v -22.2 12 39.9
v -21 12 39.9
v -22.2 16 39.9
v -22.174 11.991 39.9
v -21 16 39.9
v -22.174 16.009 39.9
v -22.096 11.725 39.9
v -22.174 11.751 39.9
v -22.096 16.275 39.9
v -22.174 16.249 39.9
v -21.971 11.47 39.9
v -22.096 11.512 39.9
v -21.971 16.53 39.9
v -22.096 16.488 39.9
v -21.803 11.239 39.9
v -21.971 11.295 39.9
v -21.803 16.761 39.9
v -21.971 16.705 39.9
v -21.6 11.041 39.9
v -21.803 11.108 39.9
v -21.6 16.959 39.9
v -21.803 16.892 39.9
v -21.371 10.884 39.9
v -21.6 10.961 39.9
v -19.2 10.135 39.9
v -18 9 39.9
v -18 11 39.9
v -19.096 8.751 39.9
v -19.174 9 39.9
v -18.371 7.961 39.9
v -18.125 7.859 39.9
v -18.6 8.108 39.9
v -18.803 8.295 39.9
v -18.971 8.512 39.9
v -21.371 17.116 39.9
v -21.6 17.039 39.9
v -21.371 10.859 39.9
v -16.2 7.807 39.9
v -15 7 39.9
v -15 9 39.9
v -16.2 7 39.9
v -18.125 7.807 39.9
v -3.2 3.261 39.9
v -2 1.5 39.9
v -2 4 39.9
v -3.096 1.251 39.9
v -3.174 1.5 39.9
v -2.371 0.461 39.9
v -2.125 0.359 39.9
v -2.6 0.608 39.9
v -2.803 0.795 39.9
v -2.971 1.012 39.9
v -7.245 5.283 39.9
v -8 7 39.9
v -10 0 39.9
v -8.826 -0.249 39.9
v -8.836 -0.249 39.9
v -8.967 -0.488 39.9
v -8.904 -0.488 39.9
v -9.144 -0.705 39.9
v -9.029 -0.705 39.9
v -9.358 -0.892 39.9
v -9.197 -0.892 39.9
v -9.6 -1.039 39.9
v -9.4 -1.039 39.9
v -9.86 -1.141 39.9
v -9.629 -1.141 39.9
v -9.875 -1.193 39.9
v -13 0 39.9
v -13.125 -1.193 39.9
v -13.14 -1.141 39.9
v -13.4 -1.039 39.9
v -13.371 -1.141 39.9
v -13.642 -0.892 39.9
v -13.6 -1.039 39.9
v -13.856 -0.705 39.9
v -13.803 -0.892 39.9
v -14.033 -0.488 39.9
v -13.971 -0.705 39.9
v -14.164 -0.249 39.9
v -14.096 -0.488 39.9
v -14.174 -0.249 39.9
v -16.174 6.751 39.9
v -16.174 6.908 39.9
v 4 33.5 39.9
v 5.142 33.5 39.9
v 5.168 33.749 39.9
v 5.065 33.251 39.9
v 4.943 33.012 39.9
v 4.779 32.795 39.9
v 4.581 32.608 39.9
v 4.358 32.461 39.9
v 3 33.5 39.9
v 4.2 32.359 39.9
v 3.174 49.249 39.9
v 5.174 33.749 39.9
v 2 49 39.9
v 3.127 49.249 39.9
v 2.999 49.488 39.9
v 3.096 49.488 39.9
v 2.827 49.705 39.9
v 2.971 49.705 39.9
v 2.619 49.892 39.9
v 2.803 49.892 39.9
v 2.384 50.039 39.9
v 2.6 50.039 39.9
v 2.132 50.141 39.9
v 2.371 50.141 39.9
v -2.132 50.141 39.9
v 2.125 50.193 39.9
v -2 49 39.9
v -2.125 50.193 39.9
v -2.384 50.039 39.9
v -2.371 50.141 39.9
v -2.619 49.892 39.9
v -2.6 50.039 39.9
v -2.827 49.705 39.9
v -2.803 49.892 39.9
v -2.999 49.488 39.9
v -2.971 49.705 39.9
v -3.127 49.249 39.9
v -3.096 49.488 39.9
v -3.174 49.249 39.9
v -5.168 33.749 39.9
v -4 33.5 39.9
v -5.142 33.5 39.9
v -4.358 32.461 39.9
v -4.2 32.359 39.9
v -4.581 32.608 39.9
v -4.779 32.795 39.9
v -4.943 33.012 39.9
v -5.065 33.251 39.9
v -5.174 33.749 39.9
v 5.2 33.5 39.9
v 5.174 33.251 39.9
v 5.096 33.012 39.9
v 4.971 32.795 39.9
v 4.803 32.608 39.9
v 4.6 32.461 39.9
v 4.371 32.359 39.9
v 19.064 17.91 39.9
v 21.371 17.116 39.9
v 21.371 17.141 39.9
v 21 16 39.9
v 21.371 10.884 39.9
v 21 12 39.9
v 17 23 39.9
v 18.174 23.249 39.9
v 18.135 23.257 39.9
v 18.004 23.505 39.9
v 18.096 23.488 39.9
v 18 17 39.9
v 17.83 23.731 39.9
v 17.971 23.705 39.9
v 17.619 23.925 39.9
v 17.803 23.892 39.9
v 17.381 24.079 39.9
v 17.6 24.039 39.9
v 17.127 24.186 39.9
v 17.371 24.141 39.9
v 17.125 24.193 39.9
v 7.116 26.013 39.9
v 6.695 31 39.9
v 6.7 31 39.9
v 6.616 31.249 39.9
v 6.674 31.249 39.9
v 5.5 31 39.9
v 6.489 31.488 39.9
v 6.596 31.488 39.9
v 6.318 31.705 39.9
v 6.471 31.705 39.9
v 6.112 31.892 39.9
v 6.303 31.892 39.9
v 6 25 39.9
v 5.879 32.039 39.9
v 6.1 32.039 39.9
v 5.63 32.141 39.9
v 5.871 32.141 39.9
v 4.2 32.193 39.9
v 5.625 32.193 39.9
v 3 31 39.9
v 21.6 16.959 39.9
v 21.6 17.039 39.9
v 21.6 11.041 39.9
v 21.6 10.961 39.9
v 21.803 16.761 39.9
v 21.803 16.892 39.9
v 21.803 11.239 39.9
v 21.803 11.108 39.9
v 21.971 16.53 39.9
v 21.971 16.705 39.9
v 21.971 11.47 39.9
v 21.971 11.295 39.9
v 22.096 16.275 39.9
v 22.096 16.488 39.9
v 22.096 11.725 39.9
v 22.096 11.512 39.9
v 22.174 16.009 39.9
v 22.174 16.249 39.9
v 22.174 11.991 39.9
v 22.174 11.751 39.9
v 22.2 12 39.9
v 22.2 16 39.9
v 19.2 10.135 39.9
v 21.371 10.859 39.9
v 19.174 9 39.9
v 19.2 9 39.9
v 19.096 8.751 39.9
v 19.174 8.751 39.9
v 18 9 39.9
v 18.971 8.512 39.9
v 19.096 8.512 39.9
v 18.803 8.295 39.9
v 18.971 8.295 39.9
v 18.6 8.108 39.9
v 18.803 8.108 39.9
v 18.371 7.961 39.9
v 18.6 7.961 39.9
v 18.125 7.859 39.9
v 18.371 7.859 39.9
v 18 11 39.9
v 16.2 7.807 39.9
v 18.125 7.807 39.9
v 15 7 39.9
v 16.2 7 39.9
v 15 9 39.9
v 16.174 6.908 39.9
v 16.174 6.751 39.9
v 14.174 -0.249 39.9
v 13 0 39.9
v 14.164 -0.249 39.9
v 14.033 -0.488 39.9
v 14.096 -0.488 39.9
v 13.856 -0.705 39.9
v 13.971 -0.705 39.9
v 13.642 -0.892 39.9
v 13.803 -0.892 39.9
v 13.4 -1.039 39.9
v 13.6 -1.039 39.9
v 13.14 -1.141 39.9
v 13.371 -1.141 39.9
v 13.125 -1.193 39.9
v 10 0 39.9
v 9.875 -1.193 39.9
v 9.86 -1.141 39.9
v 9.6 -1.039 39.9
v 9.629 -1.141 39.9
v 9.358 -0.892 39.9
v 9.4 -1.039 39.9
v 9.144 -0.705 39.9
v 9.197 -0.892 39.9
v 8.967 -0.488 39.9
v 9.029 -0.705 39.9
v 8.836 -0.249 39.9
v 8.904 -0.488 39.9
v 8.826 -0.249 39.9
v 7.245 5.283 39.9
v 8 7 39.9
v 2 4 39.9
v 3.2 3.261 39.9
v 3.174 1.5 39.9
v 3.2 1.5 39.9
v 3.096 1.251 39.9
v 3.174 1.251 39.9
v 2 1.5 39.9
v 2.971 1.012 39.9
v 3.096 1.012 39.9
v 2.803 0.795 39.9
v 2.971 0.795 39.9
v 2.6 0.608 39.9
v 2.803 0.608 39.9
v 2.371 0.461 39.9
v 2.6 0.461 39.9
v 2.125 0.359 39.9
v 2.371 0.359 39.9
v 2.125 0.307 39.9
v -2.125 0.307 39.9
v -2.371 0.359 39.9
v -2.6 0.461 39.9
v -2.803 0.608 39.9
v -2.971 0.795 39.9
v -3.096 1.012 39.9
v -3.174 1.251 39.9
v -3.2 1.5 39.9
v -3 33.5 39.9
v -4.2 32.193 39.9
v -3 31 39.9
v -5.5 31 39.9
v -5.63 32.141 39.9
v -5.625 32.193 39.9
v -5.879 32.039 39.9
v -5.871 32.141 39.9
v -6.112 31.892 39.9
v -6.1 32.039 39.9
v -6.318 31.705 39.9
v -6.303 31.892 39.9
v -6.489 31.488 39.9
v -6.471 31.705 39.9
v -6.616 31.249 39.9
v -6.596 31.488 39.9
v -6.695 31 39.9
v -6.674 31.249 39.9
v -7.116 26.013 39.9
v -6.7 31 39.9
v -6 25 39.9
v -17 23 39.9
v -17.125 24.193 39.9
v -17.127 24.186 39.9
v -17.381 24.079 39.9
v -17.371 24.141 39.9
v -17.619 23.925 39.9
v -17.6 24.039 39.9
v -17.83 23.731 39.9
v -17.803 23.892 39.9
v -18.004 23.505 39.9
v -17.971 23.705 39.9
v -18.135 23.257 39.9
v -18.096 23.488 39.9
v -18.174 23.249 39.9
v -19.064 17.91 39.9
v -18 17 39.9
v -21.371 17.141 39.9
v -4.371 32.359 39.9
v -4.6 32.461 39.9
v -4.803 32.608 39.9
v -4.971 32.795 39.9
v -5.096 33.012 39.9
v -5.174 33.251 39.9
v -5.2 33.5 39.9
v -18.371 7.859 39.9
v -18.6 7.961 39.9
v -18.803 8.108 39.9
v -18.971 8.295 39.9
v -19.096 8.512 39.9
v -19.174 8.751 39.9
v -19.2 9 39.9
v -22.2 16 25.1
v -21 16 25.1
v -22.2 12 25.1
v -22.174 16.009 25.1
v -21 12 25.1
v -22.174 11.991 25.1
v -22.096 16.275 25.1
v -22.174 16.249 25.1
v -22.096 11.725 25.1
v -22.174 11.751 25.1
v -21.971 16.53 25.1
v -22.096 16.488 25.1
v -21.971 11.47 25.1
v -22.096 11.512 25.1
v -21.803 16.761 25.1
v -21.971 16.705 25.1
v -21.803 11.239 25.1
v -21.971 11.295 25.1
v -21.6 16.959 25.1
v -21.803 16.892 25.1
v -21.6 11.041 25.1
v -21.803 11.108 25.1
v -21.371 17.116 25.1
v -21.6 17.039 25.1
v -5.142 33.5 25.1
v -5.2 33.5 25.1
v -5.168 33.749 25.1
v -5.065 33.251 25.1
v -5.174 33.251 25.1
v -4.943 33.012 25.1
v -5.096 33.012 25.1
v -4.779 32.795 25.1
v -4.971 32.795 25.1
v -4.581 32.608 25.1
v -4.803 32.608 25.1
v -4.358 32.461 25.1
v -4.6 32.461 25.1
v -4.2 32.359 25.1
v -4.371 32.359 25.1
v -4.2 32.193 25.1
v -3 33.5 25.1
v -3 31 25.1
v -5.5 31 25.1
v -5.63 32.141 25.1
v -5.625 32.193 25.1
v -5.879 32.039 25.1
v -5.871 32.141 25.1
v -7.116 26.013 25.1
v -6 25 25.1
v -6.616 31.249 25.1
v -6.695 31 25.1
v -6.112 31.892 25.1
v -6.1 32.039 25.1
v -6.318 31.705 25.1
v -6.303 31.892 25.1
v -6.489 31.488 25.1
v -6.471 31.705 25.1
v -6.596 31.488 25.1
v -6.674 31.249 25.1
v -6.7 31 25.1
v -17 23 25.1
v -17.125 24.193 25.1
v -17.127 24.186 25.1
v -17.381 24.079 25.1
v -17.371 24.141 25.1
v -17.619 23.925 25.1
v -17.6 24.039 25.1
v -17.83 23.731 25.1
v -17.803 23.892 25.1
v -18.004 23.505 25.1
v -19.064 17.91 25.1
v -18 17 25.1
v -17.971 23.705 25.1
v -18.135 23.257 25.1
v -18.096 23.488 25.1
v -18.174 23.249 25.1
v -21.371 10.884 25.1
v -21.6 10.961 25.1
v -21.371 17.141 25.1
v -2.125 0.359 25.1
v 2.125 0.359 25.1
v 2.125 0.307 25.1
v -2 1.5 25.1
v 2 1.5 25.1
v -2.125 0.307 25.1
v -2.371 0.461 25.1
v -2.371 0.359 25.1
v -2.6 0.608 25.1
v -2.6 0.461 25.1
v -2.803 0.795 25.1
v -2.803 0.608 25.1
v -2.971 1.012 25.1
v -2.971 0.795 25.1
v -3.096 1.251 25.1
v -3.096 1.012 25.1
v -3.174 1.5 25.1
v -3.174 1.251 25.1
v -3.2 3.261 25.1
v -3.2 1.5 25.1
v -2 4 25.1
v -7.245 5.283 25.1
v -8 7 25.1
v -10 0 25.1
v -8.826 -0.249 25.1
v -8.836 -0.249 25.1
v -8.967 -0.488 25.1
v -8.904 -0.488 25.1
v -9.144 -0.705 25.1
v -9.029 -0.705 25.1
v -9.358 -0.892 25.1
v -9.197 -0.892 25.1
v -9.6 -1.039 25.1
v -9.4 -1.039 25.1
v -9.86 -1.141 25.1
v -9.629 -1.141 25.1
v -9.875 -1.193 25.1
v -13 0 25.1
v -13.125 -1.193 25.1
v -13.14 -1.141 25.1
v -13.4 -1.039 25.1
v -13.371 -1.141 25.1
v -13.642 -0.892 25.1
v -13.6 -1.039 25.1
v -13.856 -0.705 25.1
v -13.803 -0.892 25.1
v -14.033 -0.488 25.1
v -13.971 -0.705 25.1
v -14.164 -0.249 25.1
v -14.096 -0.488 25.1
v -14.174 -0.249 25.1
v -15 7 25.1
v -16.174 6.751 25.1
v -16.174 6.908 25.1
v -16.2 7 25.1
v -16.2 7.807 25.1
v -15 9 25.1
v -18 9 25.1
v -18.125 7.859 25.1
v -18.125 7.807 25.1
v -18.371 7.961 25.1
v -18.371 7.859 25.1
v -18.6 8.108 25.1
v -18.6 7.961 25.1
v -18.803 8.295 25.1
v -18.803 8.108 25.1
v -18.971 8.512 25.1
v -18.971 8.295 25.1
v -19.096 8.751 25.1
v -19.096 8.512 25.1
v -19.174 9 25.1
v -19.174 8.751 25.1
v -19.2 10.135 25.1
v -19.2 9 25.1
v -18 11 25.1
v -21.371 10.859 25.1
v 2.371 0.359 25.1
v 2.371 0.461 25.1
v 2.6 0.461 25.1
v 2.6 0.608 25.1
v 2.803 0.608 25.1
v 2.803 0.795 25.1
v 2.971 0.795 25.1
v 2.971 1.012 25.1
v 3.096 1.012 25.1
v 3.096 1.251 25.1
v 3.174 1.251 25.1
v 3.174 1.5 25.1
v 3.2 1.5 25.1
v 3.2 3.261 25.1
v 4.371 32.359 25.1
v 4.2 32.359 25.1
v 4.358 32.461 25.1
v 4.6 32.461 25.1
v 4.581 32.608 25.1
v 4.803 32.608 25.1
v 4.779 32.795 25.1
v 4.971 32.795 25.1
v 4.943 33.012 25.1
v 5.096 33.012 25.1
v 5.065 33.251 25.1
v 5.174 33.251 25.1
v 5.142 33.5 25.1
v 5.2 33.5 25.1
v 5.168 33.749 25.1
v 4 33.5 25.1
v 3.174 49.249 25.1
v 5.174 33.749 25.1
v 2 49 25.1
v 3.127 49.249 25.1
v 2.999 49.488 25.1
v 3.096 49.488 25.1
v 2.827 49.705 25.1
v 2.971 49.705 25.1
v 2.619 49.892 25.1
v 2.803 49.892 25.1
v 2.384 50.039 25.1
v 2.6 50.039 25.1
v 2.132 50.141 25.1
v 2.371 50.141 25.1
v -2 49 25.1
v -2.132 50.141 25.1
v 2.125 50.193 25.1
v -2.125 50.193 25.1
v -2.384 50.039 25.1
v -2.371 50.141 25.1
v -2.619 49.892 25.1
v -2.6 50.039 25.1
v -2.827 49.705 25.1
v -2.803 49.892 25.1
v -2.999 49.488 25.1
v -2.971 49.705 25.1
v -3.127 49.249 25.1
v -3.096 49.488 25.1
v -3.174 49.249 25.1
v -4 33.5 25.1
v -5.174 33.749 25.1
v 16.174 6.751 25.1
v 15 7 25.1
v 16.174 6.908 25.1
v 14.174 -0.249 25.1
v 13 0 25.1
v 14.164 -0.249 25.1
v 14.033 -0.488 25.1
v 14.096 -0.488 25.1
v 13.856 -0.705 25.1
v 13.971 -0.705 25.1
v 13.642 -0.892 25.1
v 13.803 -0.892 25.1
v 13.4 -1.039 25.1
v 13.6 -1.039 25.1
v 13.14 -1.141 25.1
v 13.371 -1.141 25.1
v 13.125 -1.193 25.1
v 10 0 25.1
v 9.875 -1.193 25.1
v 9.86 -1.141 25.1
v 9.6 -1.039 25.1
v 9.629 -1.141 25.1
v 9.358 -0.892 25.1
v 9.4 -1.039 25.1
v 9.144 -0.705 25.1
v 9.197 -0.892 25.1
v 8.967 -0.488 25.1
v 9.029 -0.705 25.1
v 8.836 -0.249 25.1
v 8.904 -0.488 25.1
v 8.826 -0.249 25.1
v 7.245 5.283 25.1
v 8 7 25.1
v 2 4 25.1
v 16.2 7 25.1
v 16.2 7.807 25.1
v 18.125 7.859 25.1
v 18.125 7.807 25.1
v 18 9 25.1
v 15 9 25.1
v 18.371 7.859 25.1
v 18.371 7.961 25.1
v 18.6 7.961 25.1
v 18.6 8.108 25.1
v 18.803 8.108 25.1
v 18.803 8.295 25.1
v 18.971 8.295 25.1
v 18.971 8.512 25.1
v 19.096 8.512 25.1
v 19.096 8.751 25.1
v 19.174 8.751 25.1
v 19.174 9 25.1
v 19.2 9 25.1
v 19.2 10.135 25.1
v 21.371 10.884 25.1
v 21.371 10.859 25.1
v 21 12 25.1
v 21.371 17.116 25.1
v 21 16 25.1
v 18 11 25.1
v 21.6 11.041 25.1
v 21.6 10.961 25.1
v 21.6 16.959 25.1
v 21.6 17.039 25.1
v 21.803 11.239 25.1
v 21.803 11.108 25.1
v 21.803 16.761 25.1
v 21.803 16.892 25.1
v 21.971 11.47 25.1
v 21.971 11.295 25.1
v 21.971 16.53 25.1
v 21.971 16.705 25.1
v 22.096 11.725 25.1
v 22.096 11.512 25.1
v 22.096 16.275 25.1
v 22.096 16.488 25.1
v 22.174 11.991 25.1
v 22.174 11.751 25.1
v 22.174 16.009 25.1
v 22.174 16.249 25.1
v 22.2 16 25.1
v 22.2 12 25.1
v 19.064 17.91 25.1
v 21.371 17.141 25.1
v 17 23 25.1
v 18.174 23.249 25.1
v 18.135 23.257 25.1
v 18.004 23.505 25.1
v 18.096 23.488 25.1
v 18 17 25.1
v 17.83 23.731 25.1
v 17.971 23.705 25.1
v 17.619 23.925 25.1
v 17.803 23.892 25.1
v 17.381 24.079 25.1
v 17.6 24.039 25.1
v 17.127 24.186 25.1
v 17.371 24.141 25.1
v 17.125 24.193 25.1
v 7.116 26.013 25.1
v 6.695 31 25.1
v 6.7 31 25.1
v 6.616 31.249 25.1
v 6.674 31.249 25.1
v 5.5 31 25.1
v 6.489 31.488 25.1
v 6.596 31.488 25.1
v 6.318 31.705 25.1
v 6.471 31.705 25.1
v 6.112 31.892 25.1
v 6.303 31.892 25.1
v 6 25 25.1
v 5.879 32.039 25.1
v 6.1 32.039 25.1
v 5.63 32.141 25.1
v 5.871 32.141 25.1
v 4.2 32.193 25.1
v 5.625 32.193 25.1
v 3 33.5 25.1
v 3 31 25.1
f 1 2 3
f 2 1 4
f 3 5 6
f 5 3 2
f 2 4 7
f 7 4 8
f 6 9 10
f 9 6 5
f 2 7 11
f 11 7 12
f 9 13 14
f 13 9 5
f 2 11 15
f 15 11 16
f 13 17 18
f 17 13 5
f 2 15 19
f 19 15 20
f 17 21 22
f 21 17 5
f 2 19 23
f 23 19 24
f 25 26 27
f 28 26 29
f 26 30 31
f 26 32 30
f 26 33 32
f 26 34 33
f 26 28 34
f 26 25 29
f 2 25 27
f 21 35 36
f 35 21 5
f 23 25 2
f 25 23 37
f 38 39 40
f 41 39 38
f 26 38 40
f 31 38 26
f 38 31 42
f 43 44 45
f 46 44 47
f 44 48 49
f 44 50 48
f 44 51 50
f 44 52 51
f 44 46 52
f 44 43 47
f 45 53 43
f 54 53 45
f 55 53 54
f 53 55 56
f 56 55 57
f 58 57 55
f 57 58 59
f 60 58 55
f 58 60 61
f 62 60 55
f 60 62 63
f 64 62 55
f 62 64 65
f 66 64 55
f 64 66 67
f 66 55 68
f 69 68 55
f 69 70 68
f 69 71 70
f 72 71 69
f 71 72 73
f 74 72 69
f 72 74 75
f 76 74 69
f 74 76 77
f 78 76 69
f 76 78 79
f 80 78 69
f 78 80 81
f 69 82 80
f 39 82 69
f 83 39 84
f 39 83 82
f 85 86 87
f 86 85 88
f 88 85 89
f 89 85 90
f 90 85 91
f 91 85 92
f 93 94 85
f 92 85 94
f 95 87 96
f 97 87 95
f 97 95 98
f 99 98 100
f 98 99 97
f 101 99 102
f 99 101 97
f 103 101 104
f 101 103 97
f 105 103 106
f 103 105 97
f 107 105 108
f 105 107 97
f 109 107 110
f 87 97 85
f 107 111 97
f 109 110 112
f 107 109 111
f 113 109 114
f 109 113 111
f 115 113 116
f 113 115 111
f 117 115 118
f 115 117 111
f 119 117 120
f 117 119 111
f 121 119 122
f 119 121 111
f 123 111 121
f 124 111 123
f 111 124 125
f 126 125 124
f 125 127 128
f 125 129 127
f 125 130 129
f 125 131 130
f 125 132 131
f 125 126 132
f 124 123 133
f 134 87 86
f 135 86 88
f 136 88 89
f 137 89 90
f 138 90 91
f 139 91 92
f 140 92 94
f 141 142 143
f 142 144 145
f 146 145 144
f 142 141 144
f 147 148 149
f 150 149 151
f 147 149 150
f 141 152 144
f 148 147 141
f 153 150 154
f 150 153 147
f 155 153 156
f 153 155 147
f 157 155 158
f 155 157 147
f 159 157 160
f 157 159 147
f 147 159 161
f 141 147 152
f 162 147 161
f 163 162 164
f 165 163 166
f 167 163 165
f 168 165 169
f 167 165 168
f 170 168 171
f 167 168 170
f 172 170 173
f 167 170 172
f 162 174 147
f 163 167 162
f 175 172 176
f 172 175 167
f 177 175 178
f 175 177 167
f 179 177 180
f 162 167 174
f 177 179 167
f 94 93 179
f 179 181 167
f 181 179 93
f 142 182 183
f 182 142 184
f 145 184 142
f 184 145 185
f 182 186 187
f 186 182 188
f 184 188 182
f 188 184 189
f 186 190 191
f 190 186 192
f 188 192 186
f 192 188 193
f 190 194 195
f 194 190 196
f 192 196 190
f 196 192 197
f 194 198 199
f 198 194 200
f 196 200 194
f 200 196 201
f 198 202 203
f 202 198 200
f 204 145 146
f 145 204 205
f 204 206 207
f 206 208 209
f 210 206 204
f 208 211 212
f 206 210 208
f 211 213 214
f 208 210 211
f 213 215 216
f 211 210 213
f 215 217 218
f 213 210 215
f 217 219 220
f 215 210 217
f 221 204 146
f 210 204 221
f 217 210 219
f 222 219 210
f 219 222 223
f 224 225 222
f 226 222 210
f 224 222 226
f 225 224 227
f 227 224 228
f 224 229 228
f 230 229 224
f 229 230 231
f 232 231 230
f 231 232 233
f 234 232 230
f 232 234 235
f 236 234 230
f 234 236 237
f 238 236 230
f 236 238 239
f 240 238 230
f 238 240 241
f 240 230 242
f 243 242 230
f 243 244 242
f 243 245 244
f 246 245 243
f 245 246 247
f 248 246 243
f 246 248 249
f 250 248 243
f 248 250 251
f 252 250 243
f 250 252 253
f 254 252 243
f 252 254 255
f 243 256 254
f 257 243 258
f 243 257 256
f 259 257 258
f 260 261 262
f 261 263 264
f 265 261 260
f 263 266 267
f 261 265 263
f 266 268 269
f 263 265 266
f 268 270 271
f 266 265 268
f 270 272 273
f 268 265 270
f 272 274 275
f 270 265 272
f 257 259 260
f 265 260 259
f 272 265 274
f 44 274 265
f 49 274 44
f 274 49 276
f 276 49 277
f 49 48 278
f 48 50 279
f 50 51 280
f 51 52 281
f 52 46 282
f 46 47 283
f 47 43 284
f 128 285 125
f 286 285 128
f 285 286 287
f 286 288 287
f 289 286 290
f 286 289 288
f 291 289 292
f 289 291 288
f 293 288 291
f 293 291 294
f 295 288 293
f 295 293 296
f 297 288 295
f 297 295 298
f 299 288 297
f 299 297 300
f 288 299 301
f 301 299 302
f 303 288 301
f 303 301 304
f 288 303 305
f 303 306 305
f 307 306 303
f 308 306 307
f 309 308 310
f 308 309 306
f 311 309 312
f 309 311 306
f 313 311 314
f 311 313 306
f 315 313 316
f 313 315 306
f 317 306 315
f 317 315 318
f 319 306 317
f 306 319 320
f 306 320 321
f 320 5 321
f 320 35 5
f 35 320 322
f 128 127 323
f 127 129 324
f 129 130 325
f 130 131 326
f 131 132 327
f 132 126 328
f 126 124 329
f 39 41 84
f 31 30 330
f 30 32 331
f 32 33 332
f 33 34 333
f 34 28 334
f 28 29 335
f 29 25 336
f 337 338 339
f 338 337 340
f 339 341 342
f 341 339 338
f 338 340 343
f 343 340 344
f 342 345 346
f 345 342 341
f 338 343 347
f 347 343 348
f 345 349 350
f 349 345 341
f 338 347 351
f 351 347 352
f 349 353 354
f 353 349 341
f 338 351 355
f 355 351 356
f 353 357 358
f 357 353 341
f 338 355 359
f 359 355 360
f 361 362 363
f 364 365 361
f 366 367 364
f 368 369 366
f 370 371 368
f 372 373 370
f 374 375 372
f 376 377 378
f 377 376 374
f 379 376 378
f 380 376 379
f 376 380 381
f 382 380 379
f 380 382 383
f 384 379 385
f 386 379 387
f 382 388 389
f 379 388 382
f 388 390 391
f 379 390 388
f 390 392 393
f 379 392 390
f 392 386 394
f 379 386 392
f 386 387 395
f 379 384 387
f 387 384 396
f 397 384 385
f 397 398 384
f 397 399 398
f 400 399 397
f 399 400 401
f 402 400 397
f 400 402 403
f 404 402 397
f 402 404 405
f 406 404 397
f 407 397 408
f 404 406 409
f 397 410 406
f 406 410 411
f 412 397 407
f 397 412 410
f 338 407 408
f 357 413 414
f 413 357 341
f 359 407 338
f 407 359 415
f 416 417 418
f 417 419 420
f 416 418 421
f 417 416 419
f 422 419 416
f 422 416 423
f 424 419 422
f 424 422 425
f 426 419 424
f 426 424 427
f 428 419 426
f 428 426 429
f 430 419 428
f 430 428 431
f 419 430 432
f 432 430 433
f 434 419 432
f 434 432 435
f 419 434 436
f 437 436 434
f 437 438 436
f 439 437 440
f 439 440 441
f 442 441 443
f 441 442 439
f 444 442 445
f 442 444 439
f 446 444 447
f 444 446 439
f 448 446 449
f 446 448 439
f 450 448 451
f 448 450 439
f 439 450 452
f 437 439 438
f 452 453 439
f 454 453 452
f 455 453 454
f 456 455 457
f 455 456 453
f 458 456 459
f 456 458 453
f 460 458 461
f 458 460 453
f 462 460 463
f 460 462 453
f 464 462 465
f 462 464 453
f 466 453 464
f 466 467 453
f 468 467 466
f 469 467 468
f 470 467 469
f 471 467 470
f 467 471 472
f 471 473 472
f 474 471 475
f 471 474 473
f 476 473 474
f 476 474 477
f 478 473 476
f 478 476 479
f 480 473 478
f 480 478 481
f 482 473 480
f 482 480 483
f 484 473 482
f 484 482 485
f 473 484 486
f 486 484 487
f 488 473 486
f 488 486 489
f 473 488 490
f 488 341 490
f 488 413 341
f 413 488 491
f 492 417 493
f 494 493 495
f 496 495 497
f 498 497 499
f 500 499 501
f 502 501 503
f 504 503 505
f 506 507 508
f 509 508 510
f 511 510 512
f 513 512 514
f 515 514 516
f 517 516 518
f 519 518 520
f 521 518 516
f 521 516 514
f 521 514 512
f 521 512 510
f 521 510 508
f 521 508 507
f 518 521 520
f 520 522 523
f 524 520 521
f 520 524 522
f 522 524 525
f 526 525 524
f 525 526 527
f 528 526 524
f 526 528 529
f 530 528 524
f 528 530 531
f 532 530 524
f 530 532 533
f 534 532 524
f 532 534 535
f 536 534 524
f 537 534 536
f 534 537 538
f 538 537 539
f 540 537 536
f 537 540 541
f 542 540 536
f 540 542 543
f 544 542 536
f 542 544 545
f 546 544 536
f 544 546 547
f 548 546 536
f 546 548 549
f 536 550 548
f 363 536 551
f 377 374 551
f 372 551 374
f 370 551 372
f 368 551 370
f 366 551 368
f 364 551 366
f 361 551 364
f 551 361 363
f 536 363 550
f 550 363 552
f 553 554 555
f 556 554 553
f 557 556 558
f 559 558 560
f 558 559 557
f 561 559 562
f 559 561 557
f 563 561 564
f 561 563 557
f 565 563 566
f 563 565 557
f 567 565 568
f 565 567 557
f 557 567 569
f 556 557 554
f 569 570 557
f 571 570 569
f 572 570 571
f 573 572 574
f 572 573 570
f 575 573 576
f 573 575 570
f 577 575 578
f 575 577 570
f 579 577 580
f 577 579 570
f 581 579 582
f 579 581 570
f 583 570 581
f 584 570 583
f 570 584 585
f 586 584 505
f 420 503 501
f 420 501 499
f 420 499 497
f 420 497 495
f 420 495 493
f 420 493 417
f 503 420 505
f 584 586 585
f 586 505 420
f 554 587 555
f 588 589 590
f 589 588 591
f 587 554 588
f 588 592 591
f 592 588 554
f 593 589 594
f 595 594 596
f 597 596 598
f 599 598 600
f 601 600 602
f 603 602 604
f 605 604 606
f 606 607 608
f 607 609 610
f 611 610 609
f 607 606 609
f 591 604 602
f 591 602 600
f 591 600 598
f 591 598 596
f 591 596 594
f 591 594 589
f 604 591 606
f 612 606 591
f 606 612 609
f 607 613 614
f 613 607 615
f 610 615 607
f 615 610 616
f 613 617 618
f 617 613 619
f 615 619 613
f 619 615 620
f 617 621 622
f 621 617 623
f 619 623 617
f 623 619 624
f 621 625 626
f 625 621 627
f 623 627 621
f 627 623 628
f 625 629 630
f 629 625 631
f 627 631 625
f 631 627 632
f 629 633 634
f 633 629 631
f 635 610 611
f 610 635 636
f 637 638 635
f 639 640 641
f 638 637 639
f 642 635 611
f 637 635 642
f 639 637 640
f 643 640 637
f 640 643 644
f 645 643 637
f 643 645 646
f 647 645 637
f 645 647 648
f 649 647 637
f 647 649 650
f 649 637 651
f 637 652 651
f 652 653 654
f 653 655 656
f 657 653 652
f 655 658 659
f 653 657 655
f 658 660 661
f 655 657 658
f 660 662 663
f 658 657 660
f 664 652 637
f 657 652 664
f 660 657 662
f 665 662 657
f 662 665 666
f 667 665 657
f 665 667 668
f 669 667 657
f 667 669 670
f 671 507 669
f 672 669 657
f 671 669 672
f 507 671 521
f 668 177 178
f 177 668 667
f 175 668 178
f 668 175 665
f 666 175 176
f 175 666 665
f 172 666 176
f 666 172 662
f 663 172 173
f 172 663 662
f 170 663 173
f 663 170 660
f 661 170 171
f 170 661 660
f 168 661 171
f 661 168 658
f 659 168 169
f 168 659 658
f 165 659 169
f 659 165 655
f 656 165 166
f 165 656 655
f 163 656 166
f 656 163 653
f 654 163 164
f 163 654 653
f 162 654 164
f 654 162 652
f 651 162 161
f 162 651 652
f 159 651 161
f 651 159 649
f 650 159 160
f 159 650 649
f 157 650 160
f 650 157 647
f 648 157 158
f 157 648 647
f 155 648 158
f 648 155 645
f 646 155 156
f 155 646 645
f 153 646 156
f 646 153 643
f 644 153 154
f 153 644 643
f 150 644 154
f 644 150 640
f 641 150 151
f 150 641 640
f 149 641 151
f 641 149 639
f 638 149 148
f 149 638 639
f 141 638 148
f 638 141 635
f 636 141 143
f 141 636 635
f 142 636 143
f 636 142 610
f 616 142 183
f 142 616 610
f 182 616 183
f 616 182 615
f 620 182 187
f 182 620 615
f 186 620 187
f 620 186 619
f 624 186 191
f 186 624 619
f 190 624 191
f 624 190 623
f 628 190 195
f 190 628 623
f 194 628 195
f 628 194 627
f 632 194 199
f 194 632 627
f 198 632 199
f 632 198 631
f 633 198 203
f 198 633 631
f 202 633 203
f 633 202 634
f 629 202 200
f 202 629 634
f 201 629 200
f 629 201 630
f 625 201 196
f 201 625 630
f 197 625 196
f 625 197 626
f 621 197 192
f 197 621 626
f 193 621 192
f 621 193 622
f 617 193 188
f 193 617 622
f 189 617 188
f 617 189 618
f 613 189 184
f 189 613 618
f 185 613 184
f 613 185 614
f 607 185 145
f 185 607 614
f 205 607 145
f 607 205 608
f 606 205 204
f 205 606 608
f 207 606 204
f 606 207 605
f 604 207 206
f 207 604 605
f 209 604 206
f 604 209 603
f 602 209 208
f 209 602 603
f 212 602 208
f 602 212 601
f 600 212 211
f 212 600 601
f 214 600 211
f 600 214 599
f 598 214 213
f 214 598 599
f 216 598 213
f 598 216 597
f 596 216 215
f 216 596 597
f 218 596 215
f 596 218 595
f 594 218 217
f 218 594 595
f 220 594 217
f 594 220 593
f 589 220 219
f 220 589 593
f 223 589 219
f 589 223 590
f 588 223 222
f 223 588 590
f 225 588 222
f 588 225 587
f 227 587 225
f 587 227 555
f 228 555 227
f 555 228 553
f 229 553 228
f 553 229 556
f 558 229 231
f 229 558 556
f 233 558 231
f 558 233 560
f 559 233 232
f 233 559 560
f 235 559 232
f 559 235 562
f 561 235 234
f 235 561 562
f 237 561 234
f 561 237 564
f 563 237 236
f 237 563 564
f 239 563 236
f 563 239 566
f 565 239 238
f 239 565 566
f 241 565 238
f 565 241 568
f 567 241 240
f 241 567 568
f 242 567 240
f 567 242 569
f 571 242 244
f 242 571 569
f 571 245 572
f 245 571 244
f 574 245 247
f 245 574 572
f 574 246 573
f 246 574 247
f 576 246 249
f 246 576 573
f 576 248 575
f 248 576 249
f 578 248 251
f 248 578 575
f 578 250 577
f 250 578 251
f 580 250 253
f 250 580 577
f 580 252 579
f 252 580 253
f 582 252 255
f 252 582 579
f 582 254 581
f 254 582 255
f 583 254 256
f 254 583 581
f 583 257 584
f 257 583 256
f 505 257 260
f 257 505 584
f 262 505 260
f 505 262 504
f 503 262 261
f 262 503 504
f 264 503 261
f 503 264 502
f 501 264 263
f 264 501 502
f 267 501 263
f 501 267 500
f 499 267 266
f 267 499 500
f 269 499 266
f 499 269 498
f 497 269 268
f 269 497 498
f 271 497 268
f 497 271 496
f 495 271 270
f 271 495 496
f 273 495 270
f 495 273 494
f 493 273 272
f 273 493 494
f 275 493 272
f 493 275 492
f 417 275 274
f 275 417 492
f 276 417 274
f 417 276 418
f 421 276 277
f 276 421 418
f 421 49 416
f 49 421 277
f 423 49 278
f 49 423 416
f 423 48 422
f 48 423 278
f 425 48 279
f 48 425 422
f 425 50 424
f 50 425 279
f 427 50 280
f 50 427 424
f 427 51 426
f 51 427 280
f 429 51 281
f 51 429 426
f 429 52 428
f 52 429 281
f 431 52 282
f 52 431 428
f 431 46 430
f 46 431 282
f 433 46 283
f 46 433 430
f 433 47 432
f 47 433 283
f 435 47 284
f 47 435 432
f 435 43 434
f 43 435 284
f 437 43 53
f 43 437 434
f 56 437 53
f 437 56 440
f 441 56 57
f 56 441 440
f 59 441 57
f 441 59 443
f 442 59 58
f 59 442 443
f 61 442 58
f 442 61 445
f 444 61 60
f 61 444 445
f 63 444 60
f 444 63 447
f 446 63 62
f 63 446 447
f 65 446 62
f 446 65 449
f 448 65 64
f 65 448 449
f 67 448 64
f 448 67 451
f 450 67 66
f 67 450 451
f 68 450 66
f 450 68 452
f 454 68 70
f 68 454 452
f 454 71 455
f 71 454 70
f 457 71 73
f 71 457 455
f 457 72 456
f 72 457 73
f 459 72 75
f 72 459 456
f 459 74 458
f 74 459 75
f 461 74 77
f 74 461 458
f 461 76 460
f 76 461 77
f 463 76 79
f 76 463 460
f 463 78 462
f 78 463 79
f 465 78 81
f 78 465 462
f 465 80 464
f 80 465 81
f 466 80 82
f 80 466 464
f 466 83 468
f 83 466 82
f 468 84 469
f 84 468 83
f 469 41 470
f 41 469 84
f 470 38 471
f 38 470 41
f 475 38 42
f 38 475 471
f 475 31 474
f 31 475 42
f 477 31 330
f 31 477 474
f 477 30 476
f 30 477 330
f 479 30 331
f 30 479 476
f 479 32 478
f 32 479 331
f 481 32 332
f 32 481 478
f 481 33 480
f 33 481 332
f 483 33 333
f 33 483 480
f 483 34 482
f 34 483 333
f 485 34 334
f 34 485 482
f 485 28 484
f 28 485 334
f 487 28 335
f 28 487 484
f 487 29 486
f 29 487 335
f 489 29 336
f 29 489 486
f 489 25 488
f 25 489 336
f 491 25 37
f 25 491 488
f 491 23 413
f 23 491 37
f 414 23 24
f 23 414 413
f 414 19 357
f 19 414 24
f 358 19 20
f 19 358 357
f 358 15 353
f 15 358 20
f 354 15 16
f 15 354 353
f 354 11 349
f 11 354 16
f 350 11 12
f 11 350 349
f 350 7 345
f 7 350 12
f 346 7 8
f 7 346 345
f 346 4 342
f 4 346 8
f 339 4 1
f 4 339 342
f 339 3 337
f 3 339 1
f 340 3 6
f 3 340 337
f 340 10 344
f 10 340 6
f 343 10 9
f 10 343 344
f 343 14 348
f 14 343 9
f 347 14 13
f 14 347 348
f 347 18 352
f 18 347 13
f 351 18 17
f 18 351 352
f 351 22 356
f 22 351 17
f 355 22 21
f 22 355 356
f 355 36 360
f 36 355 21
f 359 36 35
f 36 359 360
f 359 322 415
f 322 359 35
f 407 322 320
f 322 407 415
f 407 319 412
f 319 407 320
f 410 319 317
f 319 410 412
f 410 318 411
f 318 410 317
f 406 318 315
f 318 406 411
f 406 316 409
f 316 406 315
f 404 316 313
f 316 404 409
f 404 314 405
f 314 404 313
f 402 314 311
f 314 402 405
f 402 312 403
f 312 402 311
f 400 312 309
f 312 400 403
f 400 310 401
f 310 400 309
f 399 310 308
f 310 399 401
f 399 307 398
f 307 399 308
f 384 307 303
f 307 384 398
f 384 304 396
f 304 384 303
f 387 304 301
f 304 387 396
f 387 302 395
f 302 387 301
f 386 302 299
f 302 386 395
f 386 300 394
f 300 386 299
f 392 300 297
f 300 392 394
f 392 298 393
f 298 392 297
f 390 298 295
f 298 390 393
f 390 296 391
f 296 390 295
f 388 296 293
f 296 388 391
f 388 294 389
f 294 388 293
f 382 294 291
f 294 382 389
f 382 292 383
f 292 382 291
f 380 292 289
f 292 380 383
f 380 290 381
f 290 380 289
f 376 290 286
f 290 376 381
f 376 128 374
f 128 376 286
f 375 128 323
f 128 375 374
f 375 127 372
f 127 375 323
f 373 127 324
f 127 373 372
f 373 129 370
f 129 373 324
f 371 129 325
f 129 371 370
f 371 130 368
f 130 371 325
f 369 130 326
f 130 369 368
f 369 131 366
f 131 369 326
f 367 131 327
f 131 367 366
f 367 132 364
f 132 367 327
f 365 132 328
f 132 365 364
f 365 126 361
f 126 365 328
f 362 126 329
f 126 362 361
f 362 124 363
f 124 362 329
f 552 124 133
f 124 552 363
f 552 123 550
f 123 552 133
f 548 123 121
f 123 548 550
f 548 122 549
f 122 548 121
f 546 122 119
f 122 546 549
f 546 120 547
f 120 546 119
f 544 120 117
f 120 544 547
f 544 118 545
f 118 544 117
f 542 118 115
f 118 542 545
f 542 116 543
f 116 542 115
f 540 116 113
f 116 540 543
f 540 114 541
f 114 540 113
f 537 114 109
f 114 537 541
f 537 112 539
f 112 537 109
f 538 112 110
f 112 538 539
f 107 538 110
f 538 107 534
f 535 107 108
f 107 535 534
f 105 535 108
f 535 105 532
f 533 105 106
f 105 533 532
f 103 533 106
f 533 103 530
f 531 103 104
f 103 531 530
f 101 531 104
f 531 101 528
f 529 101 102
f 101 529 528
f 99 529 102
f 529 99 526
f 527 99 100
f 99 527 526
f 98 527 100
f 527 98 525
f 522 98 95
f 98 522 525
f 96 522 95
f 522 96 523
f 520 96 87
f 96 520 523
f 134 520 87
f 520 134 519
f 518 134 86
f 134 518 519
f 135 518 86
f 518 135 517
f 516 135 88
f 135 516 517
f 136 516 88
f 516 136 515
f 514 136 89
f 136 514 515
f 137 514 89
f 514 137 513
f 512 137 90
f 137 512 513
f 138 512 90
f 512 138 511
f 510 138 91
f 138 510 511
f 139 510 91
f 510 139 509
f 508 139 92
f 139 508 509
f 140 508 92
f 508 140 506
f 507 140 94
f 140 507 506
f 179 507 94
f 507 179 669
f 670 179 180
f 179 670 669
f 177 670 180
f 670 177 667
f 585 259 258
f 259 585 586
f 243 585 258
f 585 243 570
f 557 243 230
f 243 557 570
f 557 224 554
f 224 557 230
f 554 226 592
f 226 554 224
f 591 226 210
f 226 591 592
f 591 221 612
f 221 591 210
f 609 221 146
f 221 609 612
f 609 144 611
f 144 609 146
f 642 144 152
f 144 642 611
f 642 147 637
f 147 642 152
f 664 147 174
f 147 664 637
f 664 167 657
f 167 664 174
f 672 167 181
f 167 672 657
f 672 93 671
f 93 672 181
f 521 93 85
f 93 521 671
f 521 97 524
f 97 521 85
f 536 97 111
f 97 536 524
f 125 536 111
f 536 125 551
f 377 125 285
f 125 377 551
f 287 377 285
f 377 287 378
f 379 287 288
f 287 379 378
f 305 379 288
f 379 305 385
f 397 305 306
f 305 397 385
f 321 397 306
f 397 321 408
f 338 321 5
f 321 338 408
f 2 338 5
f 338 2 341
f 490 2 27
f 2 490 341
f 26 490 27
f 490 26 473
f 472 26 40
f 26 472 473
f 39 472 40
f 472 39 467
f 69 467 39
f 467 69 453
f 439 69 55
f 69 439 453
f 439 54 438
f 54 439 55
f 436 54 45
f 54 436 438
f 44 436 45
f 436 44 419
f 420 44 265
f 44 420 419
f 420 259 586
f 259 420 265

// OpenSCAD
/* kihraxz-bin.scad
 *
 * Copyright (C) Robert B. Ross, 2016
 *
 * This software is released under the Creative Commons
 * Attribution-ShareAlike 4.0 International Public License.
 */

include <./bintools.scad>

$fn=160;
binHeight   = 46.5/2;
angle=0;

/* locations is a pair of triples, translate : rotate pairs
 */
locations = [[[1,28.5,0], [0,0,-30]],
             [[-1,-28.5,0], [0,0,150]]];

// harborFreightMediumHalfHt(locations,inset=1) kBlank();

// kBlank();
kOutline();

/* kOutline() -- test piece for outline
 */
module kOutline() {
   translate([0,0,40]) rotate([180,0,0]) {
      blankCutout(height=15 - 0.1, outlineScale=1.2) kBlank();
   }
}

module kBlank(centerCutout=0) {
   blankHeight = 28.5; 
   
   /* rotate, etc. positions blank upside-down on XY plane */
   rotate([180,0,0]) translate([0,0,-binHeight]) union() {
      difference() {
         translate([0,0,binHeight-blankHeight])
            linear_extrude(height=blankHeight) kShell();
      }
      if (centerCutout) linear_extrude(height=binHeight) centerCutoutPoly();
   } /* rotate, translate, union */
}

/* kShell() -- exterior outline */
module kShell() {
   for (j=[0:1]) mirror([j,0,0])
      polygon(points=[
                     [-0.1,1.5], [2,1.5], [2,4], [8,7], [10,0], [13,0],
                     [15,7], [15,9], [18,9], [18,11], [21,12], [21,16],
                     [18,17], [17,23], [6,25], [5.5,31], [3,31], [3,33.5],
                     [4,33.5], [2,49], [-0.1,49]
                     ]);
}

/* centerCutoutPoly() -- defines a polygon to be cut all the way to the
 *                       bottom of the bin.
 *
 */
module centerCutoutPoly() {
   for (j=[0:1]) mirror([j,0,0])
      polygon(points=[[-0.1,-0.1], [9.5,-0.1], [9.5,5.16], [14.64,6.23],
                      [14.64,13],[19.85,12.1],[22,17.05],// [19.7,23.41],
                      // [19.6,33.5], [19.6,37], [14.95,37], [14.95,33.5],
                      // [11.07,22.93],
                     [9.9,22.93], [9.5,25],[-0.1,25]]);
}

/*
 * Local variables:
 *  mode: C
 *  c-indent-level: 3
 *  c-basic-offset: 3
 * End:
 *
 * vim: ts=8 sts=3 sw=3 expandtab
 */
